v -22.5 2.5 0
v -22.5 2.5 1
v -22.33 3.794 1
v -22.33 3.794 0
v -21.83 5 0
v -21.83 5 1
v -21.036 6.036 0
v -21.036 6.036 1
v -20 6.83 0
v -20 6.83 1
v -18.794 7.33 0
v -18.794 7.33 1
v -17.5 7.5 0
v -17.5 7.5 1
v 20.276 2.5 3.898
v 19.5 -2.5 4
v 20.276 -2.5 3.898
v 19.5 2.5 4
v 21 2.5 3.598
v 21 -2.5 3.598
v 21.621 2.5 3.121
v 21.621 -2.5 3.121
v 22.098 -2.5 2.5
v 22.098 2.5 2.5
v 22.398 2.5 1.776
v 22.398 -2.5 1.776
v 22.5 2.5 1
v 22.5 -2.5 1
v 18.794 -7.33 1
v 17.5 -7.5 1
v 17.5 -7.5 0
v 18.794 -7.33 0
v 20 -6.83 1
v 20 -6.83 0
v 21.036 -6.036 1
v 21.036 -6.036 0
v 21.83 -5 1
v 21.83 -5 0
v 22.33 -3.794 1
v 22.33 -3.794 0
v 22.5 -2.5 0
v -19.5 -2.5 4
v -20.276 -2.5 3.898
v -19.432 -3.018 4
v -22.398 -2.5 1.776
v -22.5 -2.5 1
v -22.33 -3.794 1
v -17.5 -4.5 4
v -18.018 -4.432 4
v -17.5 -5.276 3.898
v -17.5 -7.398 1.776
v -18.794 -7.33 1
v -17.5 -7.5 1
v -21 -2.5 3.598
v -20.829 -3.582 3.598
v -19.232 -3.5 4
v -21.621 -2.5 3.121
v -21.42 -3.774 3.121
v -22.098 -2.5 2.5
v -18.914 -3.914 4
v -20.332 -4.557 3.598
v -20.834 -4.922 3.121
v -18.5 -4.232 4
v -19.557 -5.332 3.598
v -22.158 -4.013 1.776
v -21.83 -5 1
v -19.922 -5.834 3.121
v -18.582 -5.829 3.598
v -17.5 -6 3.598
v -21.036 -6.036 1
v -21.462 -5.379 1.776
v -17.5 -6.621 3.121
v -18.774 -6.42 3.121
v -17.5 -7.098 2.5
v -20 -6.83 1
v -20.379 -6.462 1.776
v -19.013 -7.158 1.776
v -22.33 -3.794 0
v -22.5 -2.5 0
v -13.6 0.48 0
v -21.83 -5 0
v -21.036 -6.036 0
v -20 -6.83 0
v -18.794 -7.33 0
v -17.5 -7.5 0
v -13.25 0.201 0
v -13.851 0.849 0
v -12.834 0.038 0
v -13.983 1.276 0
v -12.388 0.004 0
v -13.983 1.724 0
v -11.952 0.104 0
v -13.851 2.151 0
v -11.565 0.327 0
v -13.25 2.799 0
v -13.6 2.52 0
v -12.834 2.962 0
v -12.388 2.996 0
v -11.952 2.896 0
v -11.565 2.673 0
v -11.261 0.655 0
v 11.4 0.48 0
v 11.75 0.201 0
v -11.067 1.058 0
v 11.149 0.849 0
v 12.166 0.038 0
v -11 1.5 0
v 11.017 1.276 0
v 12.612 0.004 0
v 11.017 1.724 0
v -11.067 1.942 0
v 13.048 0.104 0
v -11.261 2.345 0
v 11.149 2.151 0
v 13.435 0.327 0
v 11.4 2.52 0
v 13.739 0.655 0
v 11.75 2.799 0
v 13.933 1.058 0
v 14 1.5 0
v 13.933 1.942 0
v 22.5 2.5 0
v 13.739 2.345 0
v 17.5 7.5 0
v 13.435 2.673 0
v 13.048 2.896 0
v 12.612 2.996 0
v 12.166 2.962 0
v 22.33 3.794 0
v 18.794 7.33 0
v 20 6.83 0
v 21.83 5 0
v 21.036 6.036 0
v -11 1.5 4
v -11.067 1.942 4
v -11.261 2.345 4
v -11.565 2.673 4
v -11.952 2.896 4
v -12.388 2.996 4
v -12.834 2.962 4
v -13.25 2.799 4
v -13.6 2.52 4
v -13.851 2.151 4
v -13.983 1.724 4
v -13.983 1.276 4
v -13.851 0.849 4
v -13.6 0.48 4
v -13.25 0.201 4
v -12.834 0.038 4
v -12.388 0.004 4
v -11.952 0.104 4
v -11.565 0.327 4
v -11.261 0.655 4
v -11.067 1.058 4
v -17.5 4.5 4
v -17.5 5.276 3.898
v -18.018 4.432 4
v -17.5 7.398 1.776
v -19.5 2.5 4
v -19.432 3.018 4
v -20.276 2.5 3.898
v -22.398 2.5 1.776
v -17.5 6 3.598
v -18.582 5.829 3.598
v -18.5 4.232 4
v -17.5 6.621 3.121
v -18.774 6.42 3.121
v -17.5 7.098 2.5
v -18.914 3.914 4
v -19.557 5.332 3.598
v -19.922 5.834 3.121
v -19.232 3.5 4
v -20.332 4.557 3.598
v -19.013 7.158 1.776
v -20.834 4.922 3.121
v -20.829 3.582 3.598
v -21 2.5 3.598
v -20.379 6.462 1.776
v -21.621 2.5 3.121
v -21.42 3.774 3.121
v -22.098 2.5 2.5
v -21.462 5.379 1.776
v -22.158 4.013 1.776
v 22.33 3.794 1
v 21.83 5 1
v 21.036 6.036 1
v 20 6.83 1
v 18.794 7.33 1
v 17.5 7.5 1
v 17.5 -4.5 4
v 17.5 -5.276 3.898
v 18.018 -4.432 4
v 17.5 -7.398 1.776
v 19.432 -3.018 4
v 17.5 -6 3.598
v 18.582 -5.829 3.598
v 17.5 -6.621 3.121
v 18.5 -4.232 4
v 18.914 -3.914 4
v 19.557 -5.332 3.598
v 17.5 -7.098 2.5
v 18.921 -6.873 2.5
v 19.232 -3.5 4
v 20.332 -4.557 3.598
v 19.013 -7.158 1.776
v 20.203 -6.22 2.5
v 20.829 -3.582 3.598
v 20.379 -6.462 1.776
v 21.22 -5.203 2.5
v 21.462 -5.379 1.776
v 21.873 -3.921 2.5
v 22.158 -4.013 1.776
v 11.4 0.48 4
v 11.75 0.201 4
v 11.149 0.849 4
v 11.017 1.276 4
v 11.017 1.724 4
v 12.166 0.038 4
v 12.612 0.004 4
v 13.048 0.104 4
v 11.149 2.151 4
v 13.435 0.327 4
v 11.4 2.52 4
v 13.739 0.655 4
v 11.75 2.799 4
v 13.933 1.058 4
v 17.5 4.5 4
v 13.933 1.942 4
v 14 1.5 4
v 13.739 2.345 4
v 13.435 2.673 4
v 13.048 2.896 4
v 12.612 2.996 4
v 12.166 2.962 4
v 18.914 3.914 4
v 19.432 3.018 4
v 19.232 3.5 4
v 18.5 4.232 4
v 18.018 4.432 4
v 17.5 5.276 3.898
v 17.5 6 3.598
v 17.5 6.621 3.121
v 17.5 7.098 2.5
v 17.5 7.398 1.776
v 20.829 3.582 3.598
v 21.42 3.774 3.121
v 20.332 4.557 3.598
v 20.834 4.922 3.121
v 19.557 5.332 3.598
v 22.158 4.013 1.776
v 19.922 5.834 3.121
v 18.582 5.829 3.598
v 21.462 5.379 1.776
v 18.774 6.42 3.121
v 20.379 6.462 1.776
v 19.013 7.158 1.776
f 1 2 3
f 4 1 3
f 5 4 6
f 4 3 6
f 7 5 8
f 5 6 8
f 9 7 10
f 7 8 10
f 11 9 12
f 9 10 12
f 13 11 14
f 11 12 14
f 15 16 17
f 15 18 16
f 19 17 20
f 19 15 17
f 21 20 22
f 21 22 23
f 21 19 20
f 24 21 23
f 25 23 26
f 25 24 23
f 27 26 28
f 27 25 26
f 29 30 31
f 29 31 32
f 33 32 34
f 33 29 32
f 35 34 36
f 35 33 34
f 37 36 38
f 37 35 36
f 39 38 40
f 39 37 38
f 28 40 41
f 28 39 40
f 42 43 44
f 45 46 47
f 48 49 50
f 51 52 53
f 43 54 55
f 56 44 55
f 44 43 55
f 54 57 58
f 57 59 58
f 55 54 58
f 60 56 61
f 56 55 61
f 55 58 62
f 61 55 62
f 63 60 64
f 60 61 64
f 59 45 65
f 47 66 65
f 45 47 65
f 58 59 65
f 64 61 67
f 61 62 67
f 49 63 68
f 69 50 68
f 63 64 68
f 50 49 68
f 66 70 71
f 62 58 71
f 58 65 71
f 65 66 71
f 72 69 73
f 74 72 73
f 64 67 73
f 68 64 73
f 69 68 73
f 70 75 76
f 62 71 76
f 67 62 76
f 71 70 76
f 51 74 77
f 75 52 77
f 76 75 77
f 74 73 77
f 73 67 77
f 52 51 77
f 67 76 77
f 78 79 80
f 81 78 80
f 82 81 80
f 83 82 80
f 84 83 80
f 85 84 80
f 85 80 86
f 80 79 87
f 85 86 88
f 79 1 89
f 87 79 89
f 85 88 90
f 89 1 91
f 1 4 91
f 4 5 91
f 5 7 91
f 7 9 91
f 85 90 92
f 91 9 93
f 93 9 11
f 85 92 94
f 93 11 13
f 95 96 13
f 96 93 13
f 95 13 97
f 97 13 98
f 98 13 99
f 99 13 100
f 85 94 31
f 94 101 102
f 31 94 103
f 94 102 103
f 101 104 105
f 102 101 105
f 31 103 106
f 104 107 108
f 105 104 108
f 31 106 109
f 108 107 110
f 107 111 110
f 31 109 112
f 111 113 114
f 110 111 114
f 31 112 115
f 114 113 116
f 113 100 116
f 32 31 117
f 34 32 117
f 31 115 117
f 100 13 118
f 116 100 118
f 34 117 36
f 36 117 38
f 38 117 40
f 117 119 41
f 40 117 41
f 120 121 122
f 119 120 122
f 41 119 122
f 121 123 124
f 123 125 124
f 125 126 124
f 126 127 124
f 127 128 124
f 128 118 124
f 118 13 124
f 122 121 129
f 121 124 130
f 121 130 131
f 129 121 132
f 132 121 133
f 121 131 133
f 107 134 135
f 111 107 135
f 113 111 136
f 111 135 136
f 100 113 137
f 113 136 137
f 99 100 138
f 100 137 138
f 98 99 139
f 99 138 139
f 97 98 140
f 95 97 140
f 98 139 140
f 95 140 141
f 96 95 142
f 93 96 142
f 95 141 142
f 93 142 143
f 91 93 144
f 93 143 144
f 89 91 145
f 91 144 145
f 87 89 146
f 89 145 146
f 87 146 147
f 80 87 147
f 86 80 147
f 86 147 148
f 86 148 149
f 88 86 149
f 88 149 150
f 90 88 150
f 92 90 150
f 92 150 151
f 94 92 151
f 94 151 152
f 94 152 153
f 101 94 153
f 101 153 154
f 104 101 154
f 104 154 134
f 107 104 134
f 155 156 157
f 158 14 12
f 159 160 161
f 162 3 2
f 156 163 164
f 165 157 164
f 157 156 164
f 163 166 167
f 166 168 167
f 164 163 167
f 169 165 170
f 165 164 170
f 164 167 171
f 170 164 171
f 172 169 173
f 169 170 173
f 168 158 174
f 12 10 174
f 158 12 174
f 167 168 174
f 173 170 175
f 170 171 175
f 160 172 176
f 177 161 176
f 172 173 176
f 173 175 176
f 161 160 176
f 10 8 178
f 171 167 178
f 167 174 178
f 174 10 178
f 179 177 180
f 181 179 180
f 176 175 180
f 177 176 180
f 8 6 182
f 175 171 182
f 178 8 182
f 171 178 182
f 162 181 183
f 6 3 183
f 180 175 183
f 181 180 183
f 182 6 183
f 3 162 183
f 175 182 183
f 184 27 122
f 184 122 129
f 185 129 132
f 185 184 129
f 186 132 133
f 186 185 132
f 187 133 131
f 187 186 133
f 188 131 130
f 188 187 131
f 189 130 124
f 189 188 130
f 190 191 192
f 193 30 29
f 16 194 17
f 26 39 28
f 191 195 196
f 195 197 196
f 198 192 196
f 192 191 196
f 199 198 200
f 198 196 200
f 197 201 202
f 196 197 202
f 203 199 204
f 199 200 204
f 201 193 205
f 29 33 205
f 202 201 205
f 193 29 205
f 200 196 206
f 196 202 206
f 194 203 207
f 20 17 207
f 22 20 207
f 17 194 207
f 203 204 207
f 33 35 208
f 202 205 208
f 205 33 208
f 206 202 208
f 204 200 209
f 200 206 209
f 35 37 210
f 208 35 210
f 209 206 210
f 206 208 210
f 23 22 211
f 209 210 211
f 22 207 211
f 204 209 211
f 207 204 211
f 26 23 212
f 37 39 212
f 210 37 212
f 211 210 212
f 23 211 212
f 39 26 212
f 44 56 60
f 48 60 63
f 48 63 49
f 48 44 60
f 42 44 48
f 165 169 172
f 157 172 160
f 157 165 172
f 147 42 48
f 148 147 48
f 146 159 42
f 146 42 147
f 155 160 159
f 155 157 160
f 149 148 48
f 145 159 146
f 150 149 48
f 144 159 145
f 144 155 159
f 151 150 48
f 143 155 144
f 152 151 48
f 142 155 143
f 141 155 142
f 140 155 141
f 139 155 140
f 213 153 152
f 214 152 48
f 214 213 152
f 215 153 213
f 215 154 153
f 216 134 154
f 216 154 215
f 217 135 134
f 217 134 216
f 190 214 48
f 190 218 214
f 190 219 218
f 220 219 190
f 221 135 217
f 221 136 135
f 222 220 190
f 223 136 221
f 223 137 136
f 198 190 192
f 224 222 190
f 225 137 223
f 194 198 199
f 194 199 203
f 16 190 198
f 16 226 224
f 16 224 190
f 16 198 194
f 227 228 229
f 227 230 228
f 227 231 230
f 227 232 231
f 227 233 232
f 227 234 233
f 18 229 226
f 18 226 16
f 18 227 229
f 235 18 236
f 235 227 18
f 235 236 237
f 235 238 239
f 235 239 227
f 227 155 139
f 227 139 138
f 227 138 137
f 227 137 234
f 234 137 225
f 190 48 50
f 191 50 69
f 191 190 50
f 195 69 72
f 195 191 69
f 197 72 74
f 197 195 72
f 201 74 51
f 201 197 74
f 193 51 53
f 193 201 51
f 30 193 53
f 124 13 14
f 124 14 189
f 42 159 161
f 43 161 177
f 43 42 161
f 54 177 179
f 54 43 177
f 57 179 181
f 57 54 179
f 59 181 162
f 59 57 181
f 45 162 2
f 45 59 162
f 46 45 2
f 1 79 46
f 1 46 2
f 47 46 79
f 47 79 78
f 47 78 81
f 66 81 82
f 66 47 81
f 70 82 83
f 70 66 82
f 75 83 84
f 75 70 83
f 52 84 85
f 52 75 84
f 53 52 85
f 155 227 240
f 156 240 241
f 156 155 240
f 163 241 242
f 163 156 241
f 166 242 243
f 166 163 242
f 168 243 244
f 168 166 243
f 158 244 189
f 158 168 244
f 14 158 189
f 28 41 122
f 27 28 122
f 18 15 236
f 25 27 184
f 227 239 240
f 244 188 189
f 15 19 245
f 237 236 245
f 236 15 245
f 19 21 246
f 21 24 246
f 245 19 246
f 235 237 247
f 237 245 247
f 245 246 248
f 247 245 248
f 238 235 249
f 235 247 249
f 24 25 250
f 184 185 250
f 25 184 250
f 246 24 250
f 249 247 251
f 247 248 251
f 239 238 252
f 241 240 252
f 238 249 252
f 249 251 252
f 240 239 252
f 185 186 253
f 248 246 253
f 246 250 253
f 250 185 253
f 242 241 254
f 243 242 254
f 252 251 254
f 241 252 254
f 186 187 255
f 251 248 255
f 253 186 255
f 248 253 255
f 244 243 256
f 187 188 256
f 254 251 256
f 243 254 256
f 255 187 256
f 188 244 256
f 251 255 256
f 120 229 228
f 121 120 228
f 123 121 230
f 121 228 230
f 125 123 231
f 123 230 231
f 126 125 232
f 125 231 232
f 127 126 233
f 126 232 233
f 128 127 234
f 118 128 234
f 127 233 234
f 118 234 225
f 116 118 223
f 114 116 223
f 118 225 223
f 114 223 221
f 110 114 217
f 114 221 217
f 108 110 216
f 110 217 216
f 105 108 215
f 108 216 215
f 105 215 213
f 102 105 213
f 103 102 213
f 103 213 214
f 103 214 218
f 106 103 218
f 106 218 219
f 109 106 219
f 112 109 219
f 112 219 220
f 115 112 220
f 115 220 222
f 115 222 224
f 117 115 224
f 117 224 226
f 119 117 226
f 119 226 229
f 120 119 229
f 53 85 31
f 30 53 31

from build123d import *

# Parameters (mm, degrees)
ESQUISSE1_W             = 45
ESQUISSE1_H             = 15
BOSS_EXTRU_1_DEPTH      = 4
CONG_1_R                = 5
CONG_2_R                = 3
ESQUISSE2_R             = 1.5
ENL_V_MAT_EXTRU_1_DEPTH = 5


with BuildPart() as part:
    # Esquisse1 → Boss.-Extru.1 (new body)
    with BuildSketch(Plane.XY):
        Rectangle(ESQUISSE1_W, ESQUISSE1_H)
    extrude(amount=BOSS_EXTRU_1_DEPTH)

    # Congé1
    cong_1_edges = [part.edges().sort_by_distance(p)[0] for p in [
        (-22.5, 7.5, 2),
        (22.5, 7.5, 2),
        (22.5, -7.5, 2),
        (-22.5, -7.5, 2),
    ]]
    fillet(cong_1_edges, radius=CONG_1_R)

    # Congé2
    cong_2_edges = [part.edges().sort_by_distance(p)[0] for p in [
        (22.5, 0, 4),
        (0, -7.5, 4),
        (-22.5, 0, 4),
        (0, 7.5, 4),
        (21.035533906, 6.035533906, 4),
        (-21.035533906, 6.035533906, 4),
        (-21.035533906, -6.035533906, 4),
        (21.035533906, -6.035533906, 4),
    ]]
    fillet(cong_2_edges, radius=CONG_2_R)

    # Esquisse2 → Enlèv. mat.-Extru.1 (cut, through all)
    with BuildSketch(Plane.XY.offset(4)):
        with Locations((-12.5, 1.5)):
            Circle(ESQUISSE2_R)
        with Locations((12.5, 1.5)):
            Circle(ESQUISSE2_R)
    extrude(amount=-ENL_V_MAT_EXTRU_1_DEPTH, mode=Mode.SUBTRACT)


solid = part.part
